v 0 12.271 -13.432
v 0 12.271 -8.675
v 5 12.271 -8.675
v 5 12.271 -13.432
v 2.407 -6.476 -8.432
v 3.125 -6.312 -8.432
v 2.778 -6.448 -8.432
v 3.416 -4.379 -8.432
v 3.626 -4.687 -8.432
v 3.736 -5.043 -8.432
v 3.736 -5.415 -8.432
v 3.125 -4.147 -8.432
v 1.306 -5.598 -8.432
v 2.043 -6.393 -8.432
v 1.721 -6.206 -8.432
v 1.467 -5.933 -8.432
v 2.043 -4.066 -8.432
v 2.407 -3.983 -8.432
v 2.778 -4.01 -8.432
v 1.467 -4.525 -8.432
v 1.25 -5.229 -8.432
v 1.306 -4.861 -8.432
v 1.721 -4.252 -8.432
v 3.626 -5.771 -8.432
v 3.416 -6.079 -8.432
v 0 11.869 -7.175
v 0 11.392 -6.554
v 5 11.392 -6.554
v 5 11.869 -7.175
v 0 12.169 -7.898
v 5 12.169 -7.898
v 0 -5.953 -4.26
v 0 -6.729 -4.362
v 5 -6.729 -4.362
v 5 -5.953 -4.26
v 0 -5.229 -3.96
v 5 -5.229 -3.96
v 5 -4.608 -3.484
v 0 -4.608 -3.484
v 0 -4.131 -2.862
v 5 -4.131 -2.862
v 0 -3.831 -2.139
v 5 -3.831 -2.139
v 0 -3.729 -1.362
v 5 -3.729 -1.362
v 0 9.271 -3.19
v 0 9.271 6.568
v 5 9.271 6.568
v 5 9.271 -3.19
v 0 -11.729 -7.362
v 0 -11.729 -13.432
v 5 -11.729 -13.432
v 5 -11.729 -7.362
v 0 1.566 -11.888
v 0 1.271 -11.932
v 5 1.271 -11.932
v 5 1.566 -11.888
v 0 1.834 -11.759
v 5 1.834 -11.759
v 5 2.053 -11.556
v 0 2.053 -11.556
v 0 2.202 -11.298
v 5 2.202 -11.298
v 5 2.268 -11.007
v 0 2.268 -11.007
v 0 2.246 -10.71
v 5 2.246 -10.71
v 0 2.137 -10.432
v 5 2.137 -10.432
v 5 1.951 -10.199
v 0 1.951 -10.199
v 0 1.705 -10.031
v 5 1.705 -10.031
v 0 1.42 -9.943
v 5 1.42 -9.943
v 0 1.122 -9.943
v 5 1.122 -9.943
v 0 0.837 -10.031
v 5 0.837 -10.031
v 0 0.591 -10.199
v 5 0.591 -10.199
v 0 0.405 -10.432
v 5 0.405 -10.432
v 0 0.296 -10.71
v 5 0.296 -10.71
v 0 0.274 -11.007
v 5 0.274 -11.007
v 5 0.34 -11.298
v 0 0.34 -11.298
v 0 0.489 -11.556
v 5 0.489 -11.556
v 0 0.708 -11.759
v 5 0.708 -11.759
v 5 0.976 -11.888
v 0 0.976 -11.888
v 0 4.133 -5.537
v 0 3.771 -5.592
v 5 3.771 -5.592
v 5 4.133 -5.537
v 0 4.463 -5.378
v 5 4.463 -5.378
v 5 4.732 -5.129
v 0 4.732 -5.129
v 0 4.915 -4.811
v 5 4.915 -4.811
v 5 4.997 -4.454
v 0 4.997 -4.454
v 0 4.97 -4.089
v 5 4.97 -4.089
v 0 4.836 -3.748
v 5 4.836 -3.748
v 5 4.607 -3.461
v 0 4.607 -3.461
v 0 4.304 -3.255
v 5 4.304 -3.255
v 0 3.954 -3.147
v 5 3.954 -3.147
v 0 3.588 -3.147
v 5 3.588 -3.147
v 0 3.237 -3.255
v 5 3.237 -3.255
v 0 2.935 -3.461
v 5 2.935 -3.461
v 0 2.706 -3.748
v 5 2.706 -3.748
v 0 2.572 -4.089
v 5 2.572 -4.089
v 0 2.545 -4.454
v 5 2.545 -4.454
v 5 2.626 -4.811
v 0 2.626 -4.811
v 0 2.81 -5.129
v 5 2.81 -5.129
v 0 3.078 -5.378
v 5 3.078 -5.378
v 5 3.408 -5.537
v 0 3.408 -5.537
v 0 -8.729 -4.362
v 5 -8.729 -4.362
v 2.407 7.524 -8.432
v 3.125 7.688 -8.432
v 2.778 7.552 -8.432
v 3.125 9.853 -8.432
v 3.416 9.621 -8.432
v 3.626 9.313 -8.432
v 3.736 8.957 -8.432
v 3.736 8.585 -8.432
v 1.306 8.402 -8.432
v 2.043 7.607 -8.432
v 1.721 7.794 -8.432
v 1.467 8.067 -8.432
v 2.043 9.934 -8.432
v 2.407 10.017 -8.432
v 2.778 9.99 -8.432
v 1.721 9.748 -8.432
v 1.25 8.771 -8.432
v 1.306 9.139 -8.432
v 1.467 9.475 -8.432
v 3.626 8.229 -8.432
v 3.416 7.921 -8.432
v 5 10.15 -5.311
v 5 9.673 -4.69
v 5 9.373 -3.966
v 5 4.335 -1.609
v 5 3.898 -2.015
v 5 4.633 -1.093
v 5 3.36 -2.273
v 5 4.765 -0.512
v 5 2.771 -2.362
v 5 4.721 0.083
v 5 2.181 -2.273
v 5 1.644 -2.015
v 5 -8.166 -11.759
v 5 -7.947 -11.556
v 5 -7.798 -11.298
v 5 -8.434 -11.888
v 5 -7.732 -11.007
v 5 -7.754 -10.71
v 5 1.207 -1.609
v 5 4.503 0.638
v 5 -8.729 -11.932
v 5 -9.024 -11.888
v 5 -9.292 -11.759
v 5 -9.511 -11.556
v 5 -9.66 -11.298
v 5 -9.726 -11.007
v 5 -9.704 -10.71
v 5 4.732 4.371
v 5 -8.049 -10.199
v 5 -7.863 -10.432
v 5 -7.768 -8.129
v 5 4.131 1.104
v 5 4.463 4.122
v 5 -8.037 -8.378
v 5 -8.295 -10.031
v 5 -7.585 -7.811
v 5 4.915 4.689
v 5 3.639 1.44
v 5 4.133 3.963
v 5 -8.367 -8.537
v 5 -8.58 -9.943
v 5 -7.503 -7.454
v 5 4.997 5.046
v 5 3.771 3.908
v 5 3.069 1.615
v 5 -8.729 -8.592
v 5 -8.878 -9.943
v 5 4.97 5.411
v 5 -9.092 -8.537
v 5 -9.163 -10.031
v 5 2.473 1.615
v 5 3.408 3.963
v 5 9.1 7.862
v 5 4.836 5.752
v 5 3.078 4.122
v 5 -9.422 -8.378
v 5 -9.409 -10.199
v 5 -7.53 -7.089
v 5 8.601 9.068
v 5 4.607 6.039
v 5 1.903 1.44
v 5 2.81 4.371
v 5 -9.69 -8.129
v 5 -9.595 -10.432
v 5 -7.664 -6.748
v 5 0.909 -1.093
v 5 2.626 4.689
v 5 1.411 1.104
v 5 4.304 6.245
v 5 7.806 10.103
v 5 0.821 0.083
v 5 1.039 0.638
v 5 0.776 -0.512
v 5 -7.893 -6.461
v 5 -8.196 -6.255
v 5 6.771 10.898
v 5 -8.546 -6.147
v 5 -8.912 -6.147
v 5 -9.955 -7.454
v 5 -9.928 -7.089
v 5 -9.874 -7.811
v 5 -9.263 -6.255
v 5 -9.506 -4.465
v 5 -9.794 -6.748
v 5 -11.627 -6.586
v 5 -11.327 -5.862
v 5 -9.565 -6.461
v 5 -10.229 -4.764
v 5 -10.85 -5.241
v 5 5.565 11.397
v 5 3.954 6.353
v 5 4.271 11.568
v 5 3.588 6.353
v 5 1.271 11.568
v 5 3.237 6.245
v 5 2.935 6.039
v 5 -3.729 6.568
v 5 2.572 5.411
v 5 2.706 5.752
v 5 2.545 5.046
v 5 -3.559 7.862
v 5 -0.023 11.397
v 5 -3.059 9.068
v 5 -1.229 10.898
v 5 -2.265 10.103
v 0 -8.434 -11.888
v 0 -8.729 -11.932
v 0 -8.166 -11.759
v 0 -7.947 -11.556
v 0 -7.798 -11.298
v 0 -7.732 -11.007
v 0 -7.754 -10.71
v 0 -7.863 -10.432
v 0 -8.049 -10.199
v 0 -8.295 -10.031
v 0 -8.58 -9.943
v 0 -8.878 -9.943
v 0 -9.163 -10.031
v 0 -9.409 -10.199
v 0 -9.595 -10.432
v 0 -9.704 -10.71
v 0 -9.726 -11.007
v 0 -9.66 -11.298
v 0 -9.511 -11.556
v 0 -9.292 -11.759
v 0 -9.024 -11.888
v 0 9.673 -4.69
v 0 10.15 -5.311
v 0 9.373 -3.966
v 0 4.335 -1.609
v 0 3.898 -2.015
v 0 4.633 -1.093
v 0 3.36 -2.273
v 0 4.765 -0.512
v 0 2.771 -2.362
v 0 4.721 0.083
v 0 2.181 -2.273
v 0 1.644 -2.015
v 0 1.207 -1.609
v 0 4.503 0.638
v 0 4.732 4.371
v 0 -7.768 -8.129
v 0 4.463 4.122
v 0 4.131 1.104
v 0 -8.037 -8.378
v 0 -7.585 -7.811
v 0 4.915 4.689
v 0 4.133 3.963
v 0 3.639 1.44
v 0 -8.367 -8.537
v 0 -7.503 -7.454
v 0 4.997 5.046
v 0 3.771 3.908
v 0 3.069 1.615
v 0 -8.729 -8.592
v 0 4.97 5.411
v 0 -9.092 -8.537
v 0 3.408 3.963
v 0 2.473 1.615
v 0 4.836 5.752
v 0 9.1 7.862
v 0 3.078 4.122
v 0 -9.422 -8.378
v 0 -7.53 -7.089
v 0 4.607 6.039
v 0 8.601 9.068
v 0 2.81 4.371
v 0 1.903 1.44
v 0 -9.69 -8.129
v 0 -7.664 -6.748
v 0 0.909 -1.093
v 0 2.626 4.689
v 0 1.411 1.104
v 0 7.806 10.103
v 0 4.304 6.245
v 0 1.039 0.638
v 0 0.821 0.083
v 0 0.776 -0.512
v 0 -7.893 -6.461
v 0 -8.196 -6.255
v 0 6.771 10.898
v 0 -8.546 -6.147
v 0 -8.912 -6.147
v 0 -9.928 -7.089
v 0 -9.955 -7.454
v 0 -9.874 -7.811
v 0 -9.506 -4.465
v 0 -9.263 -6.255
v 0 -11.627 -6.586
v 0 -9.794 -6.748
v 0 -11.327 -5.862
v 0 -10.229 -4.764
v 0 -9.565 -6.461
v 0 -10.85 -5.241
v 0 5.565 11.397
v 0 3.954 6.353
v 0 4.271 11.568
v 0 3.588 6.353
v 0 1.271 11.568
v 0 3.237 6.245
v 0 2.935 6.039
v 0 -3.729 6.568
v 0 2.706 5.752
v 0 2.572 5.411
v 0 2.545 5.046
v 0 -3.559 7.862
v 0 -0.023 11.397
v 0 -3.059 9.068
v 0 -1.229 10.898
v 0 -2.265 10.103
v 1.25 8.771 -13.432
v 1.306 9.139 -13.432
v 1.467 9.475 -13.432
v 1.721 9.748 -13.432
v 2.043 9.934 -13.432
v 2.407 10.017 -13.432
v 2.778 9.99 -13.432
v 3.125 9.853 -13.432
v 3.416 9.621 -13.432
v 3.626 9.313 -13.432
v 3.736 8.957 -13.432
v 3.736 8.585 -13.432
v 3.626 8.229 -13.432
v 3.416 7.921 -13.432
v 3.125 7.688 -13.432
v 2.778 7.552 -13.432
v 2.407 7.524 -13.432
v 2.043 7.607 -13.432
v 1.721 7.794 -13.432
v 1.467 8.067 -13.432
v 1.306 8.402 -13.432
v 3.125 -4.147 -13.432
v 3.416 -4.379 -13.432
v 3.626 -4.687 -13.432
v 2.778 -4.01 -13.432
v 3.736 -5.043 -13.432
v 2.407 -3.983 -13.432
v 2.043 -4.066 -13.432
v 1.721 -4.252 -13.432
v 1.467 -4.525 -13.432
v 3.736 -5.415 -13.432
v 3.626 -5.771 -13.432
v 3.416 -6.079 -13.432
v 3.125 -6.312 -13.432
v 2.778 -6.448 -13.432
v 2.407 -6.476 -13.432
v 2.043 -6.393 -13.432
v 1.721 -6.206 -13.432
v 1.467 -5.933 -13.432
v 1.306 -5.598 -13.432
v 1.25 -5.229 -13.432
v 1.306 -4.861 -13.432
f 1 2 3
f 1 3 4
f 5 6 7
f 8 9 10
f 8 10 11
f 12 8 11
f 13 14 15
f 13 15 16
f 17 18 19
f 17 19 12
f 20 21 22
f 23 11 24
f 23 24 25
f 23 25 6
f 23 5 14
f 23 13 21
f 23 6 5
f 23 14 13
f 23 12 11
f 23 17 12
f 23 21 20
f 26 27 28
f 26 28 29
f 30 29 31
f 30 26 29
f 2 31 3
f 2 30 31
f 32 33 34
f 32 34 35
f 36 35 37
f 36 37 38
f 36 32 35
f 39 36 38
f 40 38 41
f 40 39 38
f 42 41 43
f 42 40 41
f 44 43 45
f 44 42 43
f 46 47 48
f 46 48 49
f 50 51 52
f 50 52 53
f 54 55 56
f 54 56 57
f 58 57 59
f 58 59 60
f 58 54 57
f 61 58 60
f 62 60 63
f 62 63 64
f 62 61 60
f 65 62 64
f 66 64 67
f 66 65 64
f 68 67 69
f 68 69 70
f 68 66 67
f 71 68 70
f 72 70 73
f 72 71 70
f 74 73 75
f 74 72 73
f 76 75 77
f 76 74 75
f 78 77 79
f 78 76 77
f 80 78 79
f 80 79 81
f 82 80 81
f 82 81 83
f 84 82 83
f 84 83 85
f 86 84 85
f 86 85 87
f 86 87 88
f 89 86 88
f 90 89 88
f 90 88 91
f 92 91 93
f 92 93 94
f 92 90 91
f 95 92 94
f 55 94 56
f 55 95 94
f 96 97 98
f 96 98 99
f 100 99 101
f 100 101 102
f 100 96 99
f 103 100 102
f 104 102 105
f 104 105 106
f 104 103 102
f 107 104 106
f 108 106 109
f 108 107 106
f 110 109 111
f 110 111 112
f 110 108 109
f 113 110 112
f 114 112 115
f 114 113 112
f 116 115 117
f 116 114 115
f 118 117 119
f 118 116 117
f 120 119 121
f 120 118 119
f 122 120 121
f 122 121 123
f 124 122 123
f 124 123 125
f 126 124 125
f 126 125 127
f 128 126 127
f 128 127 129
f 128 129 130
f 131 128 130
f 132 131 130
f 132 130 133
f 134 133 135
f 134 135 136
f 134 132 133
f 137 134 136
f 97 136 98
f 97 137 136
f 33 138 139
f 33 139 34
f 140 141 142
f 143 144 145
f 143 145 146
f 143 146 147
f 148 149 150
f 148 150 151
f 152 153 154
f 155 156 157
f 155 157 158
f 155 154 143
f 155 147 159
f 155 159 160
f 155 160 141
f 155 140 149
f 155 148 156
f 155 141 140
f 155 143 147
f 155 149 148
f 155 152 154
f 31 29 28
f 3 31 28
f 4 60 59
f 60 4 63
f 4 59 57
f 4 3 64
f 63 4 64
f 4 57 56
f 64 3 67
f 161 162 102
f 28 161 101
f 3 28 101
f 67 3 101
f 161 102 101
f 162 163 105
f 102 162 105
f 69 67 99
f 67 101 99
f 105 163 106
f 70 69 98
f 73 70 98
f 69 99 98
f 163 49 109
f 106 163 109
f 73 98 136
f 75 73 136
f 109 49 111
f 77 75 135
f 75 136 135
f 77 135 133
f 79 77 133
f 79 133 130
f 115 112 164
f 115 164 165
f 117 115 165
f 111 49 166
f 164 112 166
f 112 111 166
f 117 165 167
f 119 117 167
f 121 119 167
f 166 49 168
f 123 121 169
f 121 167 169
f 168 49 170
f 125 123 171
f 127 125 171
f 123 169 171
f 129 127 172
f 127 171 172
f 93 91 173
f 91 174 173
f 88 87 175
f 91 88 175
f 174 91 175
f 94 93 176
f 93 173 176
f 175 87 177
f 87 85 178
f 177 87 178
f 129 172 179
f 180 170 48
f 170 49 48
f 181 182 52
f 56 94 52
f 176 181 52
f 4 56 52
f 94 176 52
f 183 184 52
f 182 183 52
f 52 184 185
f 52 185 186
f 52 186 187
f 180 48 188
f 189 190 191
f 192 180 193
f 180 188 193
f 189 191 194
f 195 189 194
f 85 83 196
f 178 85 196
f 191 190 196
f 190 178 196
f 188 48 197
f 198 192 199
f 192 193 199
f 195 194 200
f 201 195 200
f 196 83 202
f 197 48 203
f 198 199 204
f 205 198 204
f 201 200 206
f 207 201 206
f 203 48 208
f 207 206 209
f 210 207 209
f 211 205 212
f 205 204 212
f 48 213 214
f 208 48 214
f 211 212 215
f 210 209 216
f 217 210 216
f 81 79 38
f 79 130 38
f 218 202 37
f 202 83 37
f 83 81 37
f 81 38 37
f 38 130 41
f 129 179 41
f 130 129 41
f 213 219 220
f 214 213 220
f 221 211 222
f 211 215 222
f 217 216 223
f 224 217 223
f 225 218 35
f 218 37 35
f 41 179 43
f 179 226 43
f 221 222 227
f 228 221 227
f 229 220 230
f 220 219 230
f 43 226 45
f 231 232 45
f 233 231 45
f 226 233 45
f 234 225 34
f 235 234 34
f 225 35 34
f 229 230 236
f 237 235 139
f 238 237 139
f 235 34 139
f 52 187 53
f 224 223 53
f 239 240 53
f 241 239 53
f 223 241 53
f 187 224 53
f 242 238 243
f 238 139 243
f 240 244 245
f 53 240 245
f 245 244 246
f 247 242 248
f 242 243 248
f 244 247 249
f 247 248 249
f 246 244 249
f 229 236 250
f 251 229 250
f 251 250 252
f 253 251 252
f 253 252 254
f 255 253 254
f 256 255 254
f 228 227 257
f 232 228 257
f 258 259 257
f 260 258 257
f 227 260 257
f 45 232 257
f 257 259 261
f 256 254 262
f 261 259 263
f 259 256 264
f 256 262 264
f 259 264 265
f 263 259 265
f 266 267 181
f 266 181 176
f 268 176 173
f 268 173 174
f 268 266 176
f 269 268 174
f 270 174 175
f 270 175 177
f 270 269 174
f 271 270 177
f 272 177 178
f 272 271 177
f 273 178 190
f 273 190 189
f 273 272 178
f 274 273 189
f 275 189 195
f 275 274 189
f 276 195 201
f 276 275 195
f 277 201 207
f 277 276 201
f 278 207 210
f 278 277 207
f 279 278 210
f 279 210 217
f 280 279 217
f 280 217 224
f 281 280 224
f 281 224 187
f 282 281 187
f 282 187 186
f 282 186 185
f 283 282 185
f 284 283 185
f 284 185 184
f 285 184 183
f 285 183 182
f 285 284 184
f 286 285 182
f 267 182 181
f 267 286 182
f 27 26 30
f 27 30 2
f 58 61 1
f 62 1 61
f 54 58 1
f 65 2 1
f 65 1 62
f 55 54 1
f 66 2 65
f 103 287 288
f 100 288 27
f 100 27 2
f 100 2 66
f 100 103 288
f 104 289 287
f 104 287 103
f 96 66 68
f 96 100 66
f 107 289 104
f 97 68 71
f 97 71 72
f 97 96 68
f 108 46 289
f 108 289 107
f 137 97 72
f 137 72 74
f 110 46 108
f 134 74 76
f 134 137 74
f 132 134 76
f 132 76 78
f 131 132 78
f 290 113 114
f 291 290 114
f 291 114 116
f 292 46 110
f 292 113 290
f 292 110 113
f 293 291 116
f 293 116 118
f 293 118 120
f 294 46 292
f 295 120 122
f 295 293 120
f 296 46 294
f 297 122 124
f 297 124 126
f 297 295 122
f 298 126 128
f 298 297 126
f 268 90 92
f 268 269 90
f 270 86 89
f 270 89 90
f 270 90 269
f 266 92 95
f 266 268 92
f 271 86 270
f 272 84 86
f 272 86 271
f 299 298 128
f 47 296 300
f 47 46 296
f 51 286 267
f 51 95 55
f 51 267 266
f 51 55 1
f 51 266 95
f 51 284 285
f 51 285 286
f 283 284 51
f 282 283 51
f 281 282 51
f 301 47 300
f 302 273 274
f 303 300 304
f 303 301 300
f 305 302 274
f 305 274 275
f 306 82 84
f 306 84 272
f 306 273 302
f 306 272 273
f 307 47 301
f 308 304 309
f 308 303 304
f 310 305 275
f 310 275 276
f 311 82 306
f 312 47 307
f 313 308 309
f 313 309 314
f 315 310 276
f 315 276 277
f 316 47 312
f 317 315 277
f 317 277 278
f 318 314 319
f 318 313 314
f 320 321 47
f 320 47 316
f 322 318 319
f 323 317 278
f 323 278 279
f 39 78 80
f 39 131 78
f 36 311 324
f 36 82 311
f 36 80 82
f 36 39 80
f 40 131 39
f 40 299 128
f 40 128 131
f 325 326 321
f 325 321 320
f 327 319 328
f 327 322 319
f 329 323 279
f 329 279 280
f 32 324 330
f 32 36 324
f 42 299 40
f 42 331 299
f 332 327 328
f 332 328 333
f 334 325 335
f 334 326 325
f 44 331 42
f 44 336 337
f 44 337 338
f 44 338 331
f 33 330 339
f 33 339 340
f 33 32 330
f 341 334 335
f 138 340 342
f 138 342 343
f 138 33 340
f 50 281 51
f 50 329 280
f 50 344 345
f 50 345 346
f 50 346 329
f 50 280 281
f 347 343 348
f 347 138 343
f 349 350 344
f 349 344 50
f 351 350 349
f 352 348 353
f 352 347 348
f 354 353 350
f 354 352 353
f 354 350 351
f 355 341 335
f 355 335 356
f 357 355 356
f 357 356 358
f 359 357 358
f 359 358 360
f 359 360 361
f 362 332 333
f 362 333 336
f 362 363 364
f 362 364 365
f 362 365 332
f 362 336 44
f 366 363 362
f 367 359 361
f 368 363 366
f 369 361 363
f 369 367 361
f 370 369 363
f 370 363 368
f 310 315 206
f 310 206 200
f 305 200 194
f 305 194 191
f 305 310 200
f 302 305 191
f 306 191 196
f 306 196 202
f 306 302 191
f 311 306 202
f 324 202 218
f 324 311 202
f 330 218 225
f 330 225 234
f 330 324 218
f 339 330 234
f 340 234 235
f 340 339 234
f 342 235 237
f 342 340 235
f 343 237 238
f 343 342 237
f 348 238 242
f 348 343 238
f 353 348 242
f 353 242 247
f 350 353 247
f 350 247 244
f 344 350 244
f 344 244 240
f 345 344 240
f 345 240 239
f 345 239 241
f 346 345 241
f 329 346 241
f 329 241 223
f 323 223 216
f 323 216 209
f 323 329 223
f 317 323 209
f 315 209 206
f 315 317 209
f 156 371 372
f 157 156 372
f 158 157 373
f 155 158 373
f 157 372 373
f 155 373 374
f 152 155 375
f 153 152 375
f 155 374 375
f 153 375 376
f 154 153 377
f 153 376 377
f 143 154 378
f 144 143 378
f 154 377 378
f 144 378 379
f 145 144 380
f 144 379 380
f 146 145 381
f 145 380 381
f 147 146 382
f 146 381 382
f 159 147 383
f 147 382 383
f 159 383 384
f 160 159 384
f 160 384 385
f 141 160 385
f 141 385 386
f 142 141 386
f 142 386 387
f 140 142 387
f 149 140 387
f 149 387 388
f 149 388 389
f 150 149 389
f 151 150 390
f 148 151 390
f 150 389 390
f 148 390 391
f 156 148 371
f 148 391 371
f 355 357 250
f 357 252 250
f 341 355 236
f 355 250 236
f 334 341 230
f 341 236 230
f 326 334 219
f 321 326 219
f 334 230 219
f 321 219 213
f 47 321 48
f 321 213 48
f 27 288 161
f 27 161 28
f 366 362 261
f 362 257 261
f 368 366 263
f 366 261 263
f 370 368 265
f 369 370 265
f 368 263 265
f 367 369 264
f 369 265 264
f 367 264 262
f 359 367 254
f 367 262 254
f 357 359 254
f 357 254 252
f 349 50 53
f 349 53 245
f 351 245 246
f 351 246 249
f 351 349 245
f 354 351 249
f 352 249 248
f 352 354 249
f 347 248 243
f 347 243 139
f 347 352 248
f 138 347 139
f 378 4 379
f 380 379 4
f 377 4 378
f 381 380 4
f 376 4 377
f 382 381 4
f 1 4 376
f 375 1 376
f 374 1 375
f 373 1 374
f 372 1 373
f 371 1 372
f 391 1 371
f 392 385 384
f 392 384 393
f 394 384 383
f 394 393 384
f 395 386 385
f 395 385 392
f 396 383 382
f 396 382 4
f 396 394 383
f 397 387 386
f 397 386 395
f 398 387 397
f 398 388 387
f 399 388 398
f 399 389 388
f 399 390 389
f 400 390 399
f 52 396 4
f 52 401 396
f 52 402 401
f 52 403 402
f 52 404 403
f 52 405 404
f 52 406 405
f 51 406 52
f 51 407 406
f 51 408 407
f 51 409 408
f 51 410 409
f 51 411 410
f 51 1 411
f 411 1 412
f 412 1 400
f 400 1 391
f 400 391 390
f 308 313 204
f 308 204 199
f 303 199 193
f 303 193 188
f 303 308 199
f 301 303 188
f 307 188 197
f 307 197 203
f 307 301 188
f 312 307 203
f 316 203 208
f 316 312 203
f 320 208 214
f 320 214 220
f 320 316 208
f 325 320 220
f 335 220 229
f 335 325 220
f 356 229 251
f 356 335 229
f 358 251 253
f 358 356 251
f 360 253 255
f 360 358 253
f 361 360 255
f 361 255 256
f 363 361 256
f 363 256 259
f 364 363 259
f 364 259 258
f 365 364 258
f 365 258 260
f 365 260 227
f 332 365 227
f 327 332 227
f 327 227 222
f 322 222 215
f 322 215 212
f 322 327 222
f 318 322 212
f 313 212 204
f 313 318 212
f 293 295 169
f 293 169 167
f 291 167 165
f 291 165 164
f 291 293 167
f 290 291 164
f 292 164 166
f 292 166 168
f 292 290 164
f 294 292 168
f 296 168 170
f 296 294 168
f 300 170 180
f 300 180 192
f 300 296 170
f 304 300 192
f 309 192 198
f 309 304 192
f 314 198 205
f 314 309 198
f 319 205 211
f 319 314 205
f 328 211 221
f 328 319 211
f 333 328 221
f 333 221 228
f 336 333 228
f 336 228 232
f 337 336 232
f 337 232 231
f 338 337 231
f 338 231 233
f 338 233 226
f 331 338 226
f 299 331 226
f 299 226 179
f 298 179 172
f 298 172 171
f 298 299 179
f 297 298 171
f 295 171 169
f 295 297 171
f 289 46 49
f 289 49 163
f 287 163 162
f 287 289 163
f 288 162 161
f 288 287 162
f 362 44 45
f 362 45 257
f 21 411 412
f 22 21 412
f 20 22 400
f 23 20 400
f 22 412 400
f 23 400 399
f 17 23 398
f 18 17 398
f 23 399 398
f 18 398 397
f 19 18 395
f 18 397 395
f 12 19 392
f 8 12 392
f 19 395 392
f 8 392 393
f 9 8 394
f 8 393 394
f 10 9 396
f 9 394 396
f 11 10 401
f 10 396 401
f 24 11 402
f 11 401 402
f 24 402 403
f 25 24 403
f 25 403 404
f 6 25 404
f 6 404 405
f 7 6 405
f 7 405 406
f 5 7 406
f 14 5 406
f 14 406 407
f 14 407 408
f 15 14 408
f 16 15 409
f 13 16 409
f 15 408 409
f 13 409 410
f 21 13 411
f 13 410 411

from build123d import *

# Parameters (mm, degrees)
SKETCH1_R           = 1.2295
SKETCH1_R_2         = 2
SKETCH1_R_3         = 1
BOSS_EXTRUDE1_DEPTH = 5
SKETCH2_R           = 1.25
CUT_EXTRUDE1_DEPTH  = 5
FILLET1_R           = 5


with BuildPart() as part:
    # Sketch1 → Boss-Extrude1 (new body)
    with BuildSketch(Plane.YZ):
        with BuildLine():
            Line((-11.729138766, -13.432284692), (-11.729138766, -7.362284692))
            ThreePointArc((-11.729138766, -7.362284692), (-10.85045911, -5.240964348), (-8.729138766, -4.362284692))
            Line((-8.729138766, -4.362284692), (-6.729138766, -4.362284692))
            ThreePointArc((-6.729138766, -4.362284692), (-4.607818422, -3.483605035), (-3.729138766, -1.362284692))
            Line((-3.729138766, -1.362284692), (-3.729138766, 11.567715308))
            Line((-3.729138766, 11.567715308), (9.270861234, 11.567715308))
            Line((9.270861234, 11.567715308), (9.270861234, 8.567715308))
            Line((9.270861234, 8.567715308), (9.270861234, -3.189644004))
            ThreePointArc((9.270861234, -3.189644004), (9.499222636, -4.337694301), (10.14954089, -5.310964348))
            Line((10.14954089, -5.310964348), (11.392181578, -6.553605035))
            ThreePointArc((11.392181578, -6.553605035), (12.042499832, -7.526875082), (12.270861234, -8.674925379))
            Line((12.270861234, -8.674925379), (12.270861234, -13.432284692))
            Line((12.270861234, -13.432284692), (-11.729138766, -13.432284692))
        make_face()
        with Locations(Location((3.770861234, 5.137715308, 0), (0, 0, 270))):
            Circle(SKETCH1_R, mode=Mode.SUBTRACT)
        with Locations(Location((2.770861234, -0.362284692, 0), (0, 0, 270))):
            Circle(SKETCH1_R_2, mode=Mode.SUBTRACT)
        with Locations(Location((3.770861234, -4.362284692, 0), (0, 0, 270))):
            Circle(SKETCH1_R, mode=Mode.SUBTRACT)
        with Locations(Location((-8.729138766, -7.362284692, 0), (0, 0, 270))):
            Circle(SKETCH1_R, mode=Mode.SUBTRACT)
        with Locations(Location((-8.729138766, -10.932284692, 0), (0, 0, 270))):
            Circle(SKETCH1_R_3, mode=Mode.SUBTRACT)
        with Locations(Location((1.270861234, -10.932284692, 0), (0, 0, 270))):
            Circle(SKETCH1_R_3, mode=Mode.SUBTRACT)
    extrude(amount=BOSS_EXTRUDE1_DEPTH)

    # Sketch2 → Cut-Extrude1 (cut)
    with BuildSketch(Plane(origin=(0, 0, -13.432284692), x_dir=(1, 0, 0), z_dir=(0, 0, -1))):
        with Locations(Location((2.5, -8.770861234, 0), (0, 0, 180))):
            Circle(SKETCH2_R)
        with Locations(Location((2.5, 5.229138766, 0), (0, 0, 180))):
            Circle(SKETCH2_R)
    extrude(amount=-CUT_EXTRUDE1_DEPTH, mode=Mode.SUBTRACT)

    # Fillet1
    fillet1_edges = [part.edges().sort_by_distance(p)[0] for p in [
        (2.5, -3.729138766, 11.567715308),
        (2.5, 9.270861234, 11.567715308),
    ]]
    fillet(fillet1_edges, radius=FILLET1_R)


solid = part.part
